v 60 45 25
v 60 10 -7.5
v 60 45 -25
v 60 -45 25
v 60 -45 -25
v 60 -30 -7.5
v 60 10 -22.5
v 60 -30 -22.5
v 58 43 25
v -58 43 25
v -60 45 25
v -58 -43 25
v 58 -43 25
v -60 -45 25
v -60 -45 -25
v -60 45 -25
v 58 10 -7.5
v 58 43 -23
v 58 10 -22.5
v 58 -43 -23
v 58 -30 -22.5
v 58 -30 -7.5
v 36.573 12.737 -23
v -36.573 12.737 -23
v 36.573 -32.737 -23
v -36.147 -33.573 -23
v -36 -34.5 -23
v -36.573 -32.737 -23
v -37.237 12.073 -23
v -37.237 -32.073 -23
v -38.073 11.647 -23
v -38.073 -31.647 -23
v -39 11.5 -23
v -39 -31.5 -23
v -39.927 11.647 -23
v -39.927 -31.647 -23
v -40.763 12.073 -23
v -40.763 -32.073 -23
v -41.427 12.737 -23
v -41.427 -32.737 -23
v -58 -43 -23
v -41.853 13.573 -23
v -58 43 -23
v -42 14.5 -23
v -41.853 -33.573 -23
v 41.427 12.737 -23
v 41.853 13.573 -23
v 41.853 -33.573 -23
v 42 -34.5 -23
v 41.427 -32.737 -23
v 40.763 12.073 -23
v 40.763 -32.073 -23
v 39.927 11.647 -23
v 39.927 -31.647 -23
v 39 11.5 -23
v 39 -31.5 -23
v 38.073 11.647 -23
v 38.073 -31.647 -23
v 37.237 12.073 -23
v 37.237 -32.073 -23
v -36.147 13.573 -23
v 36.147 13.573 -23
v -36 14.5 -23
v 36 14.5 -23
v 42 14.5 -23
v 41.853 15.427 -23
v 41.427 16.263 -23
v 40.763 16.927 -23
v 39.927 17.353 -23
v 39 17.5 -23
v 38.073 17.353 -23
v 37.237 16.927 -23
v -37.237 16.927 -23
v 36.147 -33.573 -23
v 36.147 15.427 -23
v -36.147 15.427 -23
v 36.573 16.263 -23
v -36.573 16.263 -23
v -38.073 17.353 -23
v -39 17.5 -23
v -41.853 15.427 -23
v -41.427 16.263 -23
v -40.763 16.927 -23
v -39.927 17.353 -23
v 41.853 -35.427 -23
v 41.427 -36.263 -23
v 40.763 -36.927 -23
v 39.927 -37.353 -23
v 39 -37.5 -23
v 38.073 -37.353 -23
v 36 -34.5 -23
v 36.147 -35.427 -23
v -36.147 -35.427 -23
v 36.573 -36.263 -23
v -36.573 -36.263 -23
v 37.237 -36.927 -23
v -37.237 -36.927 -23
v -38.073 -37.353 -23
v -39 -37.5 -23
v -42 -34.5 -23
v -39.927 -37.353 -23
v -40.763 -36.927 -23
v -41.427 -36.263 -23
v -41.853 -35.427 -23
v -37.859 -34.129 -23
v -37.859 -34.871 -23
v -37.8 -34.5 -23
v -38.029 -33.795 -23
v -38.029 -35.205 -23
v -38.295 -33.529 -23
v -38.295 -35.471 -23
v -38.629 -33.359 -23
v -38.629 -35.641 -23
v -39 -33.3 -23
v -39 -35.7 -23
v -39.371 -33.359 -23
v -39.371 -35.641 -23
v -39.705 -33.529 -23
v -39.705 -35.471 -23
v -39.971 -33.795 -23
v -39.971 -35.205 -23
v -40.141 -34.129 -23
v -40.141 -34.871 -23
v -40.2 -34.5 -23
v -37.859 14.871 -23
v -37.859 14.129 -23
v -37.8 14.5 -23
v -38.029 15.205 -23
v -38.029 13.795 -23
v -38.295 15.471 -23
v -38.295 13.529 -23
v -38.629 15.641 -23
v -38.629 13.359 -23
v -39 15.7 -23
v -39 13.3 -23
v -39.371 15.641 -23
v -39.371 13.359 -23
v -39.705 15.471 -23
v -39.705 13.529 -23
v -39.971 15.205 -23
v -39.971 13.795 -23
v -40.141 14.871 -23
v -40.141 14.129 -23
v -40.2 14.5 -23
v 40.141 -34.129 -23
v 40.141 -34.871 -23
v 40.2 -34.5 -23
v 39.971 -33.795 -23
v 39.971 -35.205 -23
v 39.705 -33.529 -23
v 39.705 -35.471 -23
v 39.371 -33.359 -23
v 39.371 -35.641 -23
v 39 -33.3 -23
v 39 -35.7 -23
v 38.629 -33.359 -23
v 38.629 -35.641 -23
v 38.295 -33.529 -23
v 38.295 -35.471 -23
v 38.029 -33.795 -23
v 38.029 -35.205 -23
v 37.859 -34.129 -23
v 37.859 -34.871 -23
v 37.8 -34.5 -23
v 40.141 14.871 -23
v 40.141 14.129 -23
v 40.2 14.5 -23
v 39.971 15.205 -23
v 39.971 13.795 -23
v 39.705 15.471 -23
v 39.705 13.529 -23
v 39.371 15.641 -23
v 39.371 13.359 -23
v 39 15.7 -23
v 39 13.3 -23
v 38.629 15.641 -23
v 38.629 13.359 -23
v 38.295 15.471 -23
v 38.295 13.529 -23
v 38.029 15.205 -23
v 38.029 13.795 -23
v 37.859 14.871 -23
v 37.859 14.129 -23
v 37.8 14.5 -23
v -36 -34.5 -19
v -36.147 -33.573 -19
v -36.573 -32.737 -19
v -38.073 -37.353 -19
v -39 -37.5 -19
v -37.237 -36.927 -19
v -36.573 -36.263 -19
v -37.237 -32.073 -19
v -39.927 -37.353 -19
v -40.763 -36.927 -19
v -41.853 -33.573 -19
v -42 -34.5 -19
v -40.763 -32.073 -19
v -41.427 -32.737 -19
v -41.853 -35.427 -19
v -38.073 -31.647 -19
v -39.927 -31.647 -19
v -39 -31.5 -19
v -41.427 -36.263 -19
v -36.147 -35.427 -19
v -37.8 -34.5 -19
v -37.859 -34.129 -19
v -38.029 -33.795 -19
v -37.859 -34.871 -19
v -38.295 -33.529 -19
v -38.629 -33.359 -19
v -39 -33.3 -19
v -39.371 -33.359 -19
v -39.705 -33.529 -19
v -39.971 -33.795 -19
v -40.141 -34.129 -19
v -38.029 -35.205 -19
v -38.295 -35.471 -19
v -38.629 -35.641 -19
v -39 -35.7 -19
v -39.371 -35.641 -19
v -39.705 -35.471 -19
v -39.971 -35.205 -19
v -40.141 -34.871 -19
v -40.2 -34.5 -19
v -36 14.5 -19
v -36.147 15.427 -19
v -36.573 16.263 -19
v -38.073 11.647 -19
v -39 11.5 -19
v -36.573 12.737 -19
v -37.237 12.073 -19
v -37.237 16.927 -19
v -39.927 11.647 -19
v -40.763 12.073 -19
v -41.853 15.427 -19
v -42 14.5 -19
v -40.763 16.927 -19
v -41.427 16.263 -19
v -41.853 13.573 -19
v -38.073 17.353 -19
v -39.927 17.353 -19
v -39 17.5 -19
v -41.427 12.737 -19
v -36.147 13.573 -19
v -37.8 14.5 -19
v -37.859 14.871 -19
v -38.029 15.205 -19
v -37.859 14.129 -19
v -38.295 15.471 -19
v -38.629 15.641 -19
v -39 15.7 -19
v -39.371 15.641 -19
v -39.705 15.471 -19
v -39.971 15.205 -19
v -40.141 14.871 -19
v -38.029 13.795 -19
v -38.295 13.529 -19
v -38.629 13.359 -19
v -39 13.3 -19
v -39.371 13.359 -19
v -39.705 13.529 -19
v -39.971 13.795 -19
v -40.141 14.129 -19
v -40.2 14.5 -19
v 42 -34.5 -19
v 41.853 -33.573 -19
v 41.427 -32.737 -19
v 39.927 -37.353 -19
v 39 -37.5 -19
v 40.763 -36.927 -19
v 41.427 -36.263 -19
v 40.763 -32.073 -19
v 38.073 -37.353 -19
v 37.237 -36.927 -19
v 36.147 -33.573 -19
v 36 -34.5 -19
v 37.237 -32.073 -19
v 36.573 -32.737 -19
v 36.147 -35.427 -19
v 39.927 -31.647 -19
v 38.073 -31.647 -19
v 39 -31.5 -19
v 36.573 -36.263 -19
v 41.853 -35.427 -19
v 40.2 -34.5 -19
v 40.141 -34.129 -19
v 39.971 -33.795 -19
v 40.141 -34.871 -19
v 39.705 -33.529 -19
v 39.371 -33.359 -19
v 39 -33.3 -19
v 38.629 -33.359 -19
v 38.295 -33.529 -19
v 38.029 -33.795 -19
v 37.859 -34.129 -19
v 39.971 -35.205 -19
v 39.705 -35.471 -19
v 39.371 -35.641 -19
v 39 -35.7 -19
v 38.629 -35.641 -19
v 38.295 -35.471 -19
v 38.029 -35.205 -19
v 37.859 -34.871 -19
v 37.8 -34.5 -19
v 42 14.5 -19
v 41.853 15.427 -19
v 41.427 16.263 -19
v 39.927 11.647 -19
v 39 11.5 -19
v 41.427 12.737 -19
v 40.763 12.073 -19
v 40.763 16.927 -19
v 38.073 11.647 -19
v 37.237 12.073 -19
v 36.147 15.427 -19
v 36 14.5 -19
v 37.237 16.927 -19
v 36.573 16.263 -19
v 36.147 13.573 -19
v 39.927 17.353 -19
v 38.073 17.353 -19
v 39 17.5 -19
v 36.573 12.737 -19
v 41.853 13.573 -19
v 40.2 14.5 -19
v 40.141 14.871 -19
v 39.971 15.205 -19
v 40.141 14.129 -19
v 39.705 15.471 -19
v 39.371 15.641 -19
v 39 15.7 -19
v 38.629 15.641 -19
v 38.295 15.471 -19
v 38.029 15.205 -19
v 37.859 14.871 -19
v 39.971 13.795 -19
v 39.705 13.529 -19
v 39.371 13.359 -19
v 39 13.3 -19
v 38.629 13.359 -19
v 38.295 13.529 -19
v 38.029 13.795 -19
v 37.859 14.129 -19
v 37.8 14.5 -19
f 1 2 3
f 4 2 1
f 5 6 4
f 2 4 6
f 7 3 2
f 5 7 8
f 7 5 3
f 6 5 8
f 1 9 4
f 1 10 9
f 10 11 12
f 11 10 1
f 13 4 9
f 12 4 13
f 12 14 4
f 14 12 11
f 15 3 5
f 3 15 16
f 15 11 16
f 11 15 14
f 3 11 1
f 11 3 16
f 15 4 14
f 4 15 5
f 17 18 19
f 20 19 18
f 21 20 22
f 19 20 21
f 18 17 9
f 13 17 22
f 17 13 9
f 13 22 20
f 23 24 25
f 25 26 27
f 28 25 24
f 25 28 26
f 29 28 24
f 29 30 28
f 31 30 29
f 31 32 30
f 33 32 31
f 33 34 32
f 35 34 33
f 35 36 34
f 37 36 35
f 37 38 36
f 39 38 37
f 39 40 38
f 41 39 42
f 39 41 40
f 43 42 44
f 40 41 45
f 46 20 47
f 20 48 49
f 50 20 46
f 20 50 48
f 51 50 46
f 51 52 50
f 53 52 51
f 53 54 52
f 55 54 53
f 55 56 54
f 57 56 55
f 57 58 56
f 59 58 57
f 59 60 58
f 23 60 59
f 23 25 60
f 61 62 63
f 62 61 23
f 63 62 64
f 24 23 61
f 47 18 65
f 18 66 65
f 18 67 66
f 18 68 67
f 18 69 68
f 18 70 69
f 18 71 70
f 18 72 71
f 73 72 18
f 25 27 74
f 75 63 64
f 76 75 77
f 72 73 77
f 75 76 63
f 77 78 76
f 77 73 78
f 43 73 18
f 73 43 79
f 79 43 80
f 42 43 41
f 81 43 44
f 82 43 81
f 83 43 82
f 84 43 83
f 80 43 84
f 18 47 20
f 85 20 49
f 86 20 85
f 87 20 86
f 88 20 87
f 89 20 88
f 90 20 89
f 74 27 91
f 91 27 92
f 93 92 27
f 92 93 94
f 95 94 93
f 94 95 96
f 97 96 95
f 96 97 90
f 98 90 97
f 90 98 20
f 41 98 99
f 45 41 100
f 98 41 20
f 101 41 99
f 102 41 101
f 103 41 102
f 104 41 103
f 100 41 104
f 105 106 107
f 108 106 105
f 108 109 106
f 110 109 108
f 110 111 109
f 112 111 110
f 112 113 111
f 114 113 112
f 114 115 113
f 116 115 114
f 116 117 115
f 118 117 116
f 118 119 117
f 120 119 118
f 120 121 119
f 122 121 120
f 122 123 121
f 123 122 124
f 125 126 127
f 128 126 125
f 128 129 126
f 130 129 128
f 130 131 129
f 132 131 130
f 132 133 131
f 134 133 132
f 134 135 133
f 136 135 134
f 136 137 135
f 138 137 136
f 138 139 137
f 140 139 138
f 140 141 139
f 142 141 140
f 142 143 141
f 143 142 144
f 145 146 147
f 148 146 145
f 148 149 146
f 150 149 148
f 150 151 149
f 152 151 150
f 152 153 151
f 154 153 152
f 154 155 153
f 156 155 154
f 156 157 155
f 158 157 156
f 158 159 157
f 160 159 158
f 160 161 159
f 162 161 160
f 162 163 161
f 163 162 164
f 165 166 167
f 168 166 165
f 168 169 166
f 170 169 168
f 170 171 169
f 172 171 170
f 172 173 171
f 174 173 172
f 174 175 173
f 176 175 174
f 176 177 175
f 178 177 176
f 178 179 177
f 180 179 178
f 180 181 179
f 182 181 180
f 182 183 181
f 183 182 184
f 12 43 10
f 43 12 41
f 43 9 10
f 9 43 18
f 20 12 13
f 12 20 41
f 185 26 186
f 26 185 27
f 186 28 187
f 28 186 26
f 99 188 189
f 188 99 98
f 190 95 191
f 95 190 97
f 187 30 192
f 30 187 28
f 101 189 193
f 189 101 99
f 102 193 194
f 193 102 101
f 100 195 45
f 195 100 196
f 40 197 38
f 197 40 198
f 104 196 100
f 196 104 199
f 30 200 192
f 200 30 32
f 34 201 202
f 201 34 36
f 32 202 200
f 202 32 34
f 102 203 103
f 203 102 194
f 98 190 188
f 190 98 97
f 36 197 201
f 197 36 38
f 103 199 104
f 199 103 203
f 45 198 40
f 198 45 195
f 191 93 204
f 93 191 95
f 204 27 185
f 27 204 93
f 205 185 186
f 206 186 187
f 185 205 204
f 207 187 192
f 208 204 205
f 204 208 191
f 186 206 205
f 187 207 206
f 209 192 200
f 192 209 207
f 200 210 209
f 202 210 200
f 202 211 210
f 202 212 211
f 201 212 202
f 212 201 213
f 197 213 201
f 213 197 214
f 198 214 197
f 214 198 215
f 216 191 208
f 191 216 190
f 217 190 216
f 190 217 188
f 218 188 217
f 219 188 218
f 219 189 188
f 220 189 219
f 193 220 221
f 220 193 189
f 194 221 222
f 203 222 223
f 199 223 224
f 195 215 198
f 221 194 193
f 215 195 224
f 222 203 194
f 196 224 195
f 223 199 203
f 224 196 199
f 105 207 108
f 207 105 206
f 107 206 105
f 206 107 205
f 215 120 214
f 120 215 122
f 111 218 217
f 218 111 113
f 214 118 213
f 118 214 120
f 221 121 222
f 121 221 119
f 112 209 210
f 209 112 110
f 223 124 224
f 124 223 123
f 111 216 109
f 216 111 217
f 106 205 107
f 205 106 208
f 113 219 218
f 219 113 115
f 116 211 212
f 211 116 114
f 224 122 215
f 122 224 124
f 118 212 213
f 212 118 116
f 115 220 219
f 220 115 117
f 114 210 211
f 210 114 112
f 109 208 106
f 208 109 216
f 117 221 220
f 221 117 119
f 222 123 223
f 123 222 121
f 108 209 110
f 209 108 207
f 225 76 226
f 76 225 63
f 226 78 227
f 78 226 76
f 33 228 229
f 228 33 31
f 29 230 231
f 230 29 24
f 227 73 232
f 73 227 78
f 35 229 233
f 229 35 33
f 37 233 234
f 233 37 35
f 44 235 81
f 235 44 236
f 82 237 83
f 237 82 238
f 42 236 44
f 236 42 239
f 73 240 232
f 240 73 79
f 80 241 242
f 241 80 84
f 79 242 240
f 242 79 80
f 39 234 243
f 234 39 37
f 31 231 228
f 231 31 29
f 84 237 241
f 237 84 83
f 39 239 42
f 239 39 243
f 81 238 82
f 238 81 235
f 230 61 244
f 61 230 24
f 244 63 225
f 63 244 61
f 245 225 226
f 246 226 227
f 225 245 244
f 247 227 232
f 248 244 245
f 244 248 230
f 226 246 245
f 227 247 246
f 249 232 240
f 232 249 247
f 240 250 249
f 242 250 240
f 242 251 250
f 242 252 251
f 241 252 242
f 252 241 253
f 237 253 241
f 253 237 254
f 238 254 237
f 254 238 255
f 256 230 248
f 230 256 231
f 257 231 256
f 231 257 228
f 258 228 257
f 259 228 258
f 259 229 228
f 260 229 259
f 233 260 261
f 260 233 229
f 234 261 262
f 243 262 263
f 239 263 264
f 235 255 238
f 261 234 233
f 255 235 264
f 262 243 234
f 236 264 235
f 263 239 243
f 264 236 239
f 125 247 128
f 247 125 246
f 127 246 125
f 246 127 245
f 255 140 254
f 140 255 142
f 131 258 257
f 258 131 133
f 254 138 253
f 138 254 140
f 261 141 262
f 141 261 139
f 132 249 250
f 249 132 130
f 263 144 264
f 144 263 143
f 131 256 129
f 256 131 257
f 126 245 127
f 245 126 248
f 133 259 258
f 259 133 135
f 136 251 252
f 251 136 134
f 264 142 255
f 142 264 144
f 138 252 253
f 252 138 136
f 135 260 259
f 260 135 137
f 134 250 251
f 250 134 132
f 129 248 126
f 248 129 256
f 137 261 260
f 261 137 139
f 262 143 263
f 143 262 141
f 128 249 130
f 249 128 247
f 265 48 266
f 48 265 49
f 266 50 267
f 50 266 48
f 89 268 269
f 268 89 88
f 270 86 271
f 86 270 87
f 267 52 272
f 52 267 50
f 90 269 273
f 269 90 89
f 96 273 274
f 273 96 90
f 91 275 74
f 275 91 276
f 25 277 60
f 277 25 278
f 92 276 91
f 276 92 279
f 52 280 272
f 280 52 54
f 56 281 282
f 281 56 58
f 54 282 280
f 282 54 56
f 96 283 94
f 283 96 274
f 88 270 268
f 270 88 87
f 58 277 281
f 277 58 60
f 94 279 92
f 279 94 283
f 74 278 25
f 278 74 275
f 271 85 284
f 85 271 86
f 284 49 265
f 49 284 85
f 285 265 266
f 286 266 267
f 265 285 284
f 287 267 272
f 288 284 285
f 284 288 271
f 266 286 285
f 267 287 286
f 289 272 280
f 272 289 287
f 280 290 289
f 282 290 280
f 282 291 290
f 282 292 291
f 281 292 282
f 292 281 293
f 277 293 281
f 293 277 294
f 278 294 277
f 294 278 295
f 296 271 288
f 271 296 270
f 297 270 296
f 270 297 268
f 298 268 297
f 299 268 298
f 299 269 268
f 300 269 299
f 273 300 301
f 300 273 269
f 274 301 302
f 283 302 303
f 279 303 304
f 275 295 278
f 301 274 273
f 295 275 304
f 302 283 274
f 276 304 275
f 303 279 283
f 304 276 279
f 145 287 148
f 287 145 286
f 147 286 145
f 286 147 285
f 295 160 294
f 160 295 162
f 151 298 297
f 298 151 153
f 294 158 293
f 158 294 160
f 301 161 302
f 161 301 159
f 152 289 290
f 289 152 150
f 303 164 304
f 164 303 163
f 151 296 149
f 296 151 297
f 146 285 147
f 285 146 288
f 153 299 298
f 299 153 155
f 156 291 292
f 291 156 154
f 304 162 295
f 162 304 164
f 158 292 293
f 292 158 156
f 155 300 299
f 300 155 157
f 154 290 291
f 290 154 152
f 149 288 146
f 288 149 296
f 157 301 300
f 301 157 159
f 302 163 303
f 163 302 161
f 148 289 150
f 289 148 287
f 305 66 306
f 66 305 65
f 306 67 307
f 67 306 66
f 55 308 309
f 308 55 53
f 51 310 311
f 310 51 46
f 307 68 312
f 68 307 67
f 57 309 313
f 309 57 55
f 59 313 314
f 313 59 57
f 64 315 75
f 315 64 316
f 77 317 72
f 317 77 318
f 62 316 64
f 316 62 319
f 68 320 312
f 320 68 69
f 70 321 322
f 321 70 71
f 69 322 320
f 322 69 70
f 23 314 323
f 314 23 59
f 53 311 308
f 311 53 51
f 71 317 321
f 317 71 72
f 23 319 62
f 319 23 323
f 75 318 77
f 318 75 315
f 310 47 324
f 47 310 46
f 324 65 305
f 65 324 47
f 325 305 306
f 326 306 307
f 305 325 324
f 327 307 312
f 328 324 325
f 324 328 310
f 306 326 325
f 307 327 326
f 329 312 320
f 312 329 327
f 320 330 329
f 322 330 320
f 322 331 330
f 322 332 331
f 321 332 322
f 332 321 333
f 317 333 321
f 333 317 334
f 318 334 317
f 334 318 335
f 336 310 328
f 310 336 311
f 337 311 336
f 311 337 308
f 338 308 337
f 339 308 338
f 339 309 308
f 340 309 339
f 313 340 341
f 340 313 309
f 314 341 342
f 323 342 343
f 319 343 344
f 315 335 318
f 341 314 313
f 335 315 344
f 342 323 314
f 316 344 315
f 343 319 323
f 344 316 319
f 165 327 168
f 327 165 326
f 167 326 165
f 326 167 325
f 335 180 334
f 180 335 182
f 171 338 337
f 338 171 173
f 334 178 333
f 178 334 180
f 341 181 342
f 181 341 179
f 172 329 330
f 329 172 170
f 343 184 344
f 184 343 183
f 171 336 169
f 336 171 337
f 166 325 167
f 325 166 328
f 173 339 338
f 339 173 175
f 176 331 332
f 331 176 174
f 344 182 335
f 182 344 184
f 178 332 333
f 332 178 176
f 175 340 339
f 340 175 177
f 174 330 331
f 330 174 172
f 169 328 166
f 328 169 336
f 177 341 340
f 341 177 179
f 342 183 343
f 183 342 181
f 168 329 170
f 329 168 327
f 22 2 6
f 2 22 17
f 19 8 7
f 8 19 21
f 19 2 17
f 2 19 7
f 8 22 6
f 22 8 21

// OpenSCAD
// Life Trace Edge Hub - 3D Printable Enclosure
// Compatible with OpenSCAD (https://openscad.org/)
// 
// This script generates a parameterized 3D model for your project.
// Render it in OpenSCAD and export as STL for your 3D printer.

/* [Dimensions] */
box_width = 120;
box_length = 90;
box_height = 50;
wall_thickness = 2;

/* [Finger Cradle] */
finger_radius = 12;
finger_length = 50;

/* [Raspberry Pi Mount] */
pi_width = 85;
pi_length = 56;
mount_height = 5;

module base_box() {
    difference() {
        // Outer Shell
        cube([box_width, box_length, box_height], center=true);
        // Inner Cavity
        translate([0, 0, wall_thickness])
            cube([box_width - wall_thickness*2, box_length - wall_thickness*2, box_height], center=true);
    }
}

module finger_cradle() {
    // A rounded cut-out on the top surface where the user places their finger
    translate([0, box_length/2 - finger_length/2 - 10, box_height/2])
        rotate([90, 0, 0])
            cylinder(r=finger_radius, h=finger_length, center=true, $fn=50);
}

module sensor_cutouts() {
    // Hole for Raspberry Pi Camera (pointing at the finger)
    // Assuming camera is mounted above or looking directly at the finger
    translate([0, box_length/2 - 25, box_height/2 - finger_radius])
        cylinder(r=5, h=10, center=true, $fn=30);
        
    // Hole for MAX30102 Heart Rate Sensor (bottom of the finger cradle)
    translate([-10, box_length/2 - 30, box_height/2 - finger_radius])
        cylinder(r=4, h=10, center=true, $fn=30);
        
    // Hole for MLX90614 Temperature Sensor
    translate([10, box_length/2 - 30, box_height/2 - finger_radius])
        cylinder(r=4, h=10, center=true, $fn=30);
}

module pi_mounts() {
    // Simple mounting standoffs for Raspberry Pi 4
    mount_x = pi_width/2 - 3.5;
    mount_y = pi_length/2 - 3.5;
    
    translate([0, -10, -box_height/2 + wall_thickness/2 + mount_height/2]) {
        for (x = [-mount_x, mount_x]) {
            for (y = [-mount_y, mount_y]) {
                translate([x, y, 0])
                    difference() {
                        cylinder(r=3, h=mount_height, center=true, $fn=20);
                        cylinder(r=1.2, h=mount_height+1, center=true, $fn=20); // Screw hole
                    }
            }
        }
    }
}

// Assemble the final case
difference() {
    union() {
        base_box();
        pi_mounts();
    }
    // Subtract the finger cradle and sensor holes from the top
    finger_cradle();
    sensor_cutouts();
    
    // Add port cutouts for Raspberry Pi (Power/HDMI)
    translate([box_width/2, -10, -box_height/2 + 10])
        cube([10, 40, 15], center=true);
}
